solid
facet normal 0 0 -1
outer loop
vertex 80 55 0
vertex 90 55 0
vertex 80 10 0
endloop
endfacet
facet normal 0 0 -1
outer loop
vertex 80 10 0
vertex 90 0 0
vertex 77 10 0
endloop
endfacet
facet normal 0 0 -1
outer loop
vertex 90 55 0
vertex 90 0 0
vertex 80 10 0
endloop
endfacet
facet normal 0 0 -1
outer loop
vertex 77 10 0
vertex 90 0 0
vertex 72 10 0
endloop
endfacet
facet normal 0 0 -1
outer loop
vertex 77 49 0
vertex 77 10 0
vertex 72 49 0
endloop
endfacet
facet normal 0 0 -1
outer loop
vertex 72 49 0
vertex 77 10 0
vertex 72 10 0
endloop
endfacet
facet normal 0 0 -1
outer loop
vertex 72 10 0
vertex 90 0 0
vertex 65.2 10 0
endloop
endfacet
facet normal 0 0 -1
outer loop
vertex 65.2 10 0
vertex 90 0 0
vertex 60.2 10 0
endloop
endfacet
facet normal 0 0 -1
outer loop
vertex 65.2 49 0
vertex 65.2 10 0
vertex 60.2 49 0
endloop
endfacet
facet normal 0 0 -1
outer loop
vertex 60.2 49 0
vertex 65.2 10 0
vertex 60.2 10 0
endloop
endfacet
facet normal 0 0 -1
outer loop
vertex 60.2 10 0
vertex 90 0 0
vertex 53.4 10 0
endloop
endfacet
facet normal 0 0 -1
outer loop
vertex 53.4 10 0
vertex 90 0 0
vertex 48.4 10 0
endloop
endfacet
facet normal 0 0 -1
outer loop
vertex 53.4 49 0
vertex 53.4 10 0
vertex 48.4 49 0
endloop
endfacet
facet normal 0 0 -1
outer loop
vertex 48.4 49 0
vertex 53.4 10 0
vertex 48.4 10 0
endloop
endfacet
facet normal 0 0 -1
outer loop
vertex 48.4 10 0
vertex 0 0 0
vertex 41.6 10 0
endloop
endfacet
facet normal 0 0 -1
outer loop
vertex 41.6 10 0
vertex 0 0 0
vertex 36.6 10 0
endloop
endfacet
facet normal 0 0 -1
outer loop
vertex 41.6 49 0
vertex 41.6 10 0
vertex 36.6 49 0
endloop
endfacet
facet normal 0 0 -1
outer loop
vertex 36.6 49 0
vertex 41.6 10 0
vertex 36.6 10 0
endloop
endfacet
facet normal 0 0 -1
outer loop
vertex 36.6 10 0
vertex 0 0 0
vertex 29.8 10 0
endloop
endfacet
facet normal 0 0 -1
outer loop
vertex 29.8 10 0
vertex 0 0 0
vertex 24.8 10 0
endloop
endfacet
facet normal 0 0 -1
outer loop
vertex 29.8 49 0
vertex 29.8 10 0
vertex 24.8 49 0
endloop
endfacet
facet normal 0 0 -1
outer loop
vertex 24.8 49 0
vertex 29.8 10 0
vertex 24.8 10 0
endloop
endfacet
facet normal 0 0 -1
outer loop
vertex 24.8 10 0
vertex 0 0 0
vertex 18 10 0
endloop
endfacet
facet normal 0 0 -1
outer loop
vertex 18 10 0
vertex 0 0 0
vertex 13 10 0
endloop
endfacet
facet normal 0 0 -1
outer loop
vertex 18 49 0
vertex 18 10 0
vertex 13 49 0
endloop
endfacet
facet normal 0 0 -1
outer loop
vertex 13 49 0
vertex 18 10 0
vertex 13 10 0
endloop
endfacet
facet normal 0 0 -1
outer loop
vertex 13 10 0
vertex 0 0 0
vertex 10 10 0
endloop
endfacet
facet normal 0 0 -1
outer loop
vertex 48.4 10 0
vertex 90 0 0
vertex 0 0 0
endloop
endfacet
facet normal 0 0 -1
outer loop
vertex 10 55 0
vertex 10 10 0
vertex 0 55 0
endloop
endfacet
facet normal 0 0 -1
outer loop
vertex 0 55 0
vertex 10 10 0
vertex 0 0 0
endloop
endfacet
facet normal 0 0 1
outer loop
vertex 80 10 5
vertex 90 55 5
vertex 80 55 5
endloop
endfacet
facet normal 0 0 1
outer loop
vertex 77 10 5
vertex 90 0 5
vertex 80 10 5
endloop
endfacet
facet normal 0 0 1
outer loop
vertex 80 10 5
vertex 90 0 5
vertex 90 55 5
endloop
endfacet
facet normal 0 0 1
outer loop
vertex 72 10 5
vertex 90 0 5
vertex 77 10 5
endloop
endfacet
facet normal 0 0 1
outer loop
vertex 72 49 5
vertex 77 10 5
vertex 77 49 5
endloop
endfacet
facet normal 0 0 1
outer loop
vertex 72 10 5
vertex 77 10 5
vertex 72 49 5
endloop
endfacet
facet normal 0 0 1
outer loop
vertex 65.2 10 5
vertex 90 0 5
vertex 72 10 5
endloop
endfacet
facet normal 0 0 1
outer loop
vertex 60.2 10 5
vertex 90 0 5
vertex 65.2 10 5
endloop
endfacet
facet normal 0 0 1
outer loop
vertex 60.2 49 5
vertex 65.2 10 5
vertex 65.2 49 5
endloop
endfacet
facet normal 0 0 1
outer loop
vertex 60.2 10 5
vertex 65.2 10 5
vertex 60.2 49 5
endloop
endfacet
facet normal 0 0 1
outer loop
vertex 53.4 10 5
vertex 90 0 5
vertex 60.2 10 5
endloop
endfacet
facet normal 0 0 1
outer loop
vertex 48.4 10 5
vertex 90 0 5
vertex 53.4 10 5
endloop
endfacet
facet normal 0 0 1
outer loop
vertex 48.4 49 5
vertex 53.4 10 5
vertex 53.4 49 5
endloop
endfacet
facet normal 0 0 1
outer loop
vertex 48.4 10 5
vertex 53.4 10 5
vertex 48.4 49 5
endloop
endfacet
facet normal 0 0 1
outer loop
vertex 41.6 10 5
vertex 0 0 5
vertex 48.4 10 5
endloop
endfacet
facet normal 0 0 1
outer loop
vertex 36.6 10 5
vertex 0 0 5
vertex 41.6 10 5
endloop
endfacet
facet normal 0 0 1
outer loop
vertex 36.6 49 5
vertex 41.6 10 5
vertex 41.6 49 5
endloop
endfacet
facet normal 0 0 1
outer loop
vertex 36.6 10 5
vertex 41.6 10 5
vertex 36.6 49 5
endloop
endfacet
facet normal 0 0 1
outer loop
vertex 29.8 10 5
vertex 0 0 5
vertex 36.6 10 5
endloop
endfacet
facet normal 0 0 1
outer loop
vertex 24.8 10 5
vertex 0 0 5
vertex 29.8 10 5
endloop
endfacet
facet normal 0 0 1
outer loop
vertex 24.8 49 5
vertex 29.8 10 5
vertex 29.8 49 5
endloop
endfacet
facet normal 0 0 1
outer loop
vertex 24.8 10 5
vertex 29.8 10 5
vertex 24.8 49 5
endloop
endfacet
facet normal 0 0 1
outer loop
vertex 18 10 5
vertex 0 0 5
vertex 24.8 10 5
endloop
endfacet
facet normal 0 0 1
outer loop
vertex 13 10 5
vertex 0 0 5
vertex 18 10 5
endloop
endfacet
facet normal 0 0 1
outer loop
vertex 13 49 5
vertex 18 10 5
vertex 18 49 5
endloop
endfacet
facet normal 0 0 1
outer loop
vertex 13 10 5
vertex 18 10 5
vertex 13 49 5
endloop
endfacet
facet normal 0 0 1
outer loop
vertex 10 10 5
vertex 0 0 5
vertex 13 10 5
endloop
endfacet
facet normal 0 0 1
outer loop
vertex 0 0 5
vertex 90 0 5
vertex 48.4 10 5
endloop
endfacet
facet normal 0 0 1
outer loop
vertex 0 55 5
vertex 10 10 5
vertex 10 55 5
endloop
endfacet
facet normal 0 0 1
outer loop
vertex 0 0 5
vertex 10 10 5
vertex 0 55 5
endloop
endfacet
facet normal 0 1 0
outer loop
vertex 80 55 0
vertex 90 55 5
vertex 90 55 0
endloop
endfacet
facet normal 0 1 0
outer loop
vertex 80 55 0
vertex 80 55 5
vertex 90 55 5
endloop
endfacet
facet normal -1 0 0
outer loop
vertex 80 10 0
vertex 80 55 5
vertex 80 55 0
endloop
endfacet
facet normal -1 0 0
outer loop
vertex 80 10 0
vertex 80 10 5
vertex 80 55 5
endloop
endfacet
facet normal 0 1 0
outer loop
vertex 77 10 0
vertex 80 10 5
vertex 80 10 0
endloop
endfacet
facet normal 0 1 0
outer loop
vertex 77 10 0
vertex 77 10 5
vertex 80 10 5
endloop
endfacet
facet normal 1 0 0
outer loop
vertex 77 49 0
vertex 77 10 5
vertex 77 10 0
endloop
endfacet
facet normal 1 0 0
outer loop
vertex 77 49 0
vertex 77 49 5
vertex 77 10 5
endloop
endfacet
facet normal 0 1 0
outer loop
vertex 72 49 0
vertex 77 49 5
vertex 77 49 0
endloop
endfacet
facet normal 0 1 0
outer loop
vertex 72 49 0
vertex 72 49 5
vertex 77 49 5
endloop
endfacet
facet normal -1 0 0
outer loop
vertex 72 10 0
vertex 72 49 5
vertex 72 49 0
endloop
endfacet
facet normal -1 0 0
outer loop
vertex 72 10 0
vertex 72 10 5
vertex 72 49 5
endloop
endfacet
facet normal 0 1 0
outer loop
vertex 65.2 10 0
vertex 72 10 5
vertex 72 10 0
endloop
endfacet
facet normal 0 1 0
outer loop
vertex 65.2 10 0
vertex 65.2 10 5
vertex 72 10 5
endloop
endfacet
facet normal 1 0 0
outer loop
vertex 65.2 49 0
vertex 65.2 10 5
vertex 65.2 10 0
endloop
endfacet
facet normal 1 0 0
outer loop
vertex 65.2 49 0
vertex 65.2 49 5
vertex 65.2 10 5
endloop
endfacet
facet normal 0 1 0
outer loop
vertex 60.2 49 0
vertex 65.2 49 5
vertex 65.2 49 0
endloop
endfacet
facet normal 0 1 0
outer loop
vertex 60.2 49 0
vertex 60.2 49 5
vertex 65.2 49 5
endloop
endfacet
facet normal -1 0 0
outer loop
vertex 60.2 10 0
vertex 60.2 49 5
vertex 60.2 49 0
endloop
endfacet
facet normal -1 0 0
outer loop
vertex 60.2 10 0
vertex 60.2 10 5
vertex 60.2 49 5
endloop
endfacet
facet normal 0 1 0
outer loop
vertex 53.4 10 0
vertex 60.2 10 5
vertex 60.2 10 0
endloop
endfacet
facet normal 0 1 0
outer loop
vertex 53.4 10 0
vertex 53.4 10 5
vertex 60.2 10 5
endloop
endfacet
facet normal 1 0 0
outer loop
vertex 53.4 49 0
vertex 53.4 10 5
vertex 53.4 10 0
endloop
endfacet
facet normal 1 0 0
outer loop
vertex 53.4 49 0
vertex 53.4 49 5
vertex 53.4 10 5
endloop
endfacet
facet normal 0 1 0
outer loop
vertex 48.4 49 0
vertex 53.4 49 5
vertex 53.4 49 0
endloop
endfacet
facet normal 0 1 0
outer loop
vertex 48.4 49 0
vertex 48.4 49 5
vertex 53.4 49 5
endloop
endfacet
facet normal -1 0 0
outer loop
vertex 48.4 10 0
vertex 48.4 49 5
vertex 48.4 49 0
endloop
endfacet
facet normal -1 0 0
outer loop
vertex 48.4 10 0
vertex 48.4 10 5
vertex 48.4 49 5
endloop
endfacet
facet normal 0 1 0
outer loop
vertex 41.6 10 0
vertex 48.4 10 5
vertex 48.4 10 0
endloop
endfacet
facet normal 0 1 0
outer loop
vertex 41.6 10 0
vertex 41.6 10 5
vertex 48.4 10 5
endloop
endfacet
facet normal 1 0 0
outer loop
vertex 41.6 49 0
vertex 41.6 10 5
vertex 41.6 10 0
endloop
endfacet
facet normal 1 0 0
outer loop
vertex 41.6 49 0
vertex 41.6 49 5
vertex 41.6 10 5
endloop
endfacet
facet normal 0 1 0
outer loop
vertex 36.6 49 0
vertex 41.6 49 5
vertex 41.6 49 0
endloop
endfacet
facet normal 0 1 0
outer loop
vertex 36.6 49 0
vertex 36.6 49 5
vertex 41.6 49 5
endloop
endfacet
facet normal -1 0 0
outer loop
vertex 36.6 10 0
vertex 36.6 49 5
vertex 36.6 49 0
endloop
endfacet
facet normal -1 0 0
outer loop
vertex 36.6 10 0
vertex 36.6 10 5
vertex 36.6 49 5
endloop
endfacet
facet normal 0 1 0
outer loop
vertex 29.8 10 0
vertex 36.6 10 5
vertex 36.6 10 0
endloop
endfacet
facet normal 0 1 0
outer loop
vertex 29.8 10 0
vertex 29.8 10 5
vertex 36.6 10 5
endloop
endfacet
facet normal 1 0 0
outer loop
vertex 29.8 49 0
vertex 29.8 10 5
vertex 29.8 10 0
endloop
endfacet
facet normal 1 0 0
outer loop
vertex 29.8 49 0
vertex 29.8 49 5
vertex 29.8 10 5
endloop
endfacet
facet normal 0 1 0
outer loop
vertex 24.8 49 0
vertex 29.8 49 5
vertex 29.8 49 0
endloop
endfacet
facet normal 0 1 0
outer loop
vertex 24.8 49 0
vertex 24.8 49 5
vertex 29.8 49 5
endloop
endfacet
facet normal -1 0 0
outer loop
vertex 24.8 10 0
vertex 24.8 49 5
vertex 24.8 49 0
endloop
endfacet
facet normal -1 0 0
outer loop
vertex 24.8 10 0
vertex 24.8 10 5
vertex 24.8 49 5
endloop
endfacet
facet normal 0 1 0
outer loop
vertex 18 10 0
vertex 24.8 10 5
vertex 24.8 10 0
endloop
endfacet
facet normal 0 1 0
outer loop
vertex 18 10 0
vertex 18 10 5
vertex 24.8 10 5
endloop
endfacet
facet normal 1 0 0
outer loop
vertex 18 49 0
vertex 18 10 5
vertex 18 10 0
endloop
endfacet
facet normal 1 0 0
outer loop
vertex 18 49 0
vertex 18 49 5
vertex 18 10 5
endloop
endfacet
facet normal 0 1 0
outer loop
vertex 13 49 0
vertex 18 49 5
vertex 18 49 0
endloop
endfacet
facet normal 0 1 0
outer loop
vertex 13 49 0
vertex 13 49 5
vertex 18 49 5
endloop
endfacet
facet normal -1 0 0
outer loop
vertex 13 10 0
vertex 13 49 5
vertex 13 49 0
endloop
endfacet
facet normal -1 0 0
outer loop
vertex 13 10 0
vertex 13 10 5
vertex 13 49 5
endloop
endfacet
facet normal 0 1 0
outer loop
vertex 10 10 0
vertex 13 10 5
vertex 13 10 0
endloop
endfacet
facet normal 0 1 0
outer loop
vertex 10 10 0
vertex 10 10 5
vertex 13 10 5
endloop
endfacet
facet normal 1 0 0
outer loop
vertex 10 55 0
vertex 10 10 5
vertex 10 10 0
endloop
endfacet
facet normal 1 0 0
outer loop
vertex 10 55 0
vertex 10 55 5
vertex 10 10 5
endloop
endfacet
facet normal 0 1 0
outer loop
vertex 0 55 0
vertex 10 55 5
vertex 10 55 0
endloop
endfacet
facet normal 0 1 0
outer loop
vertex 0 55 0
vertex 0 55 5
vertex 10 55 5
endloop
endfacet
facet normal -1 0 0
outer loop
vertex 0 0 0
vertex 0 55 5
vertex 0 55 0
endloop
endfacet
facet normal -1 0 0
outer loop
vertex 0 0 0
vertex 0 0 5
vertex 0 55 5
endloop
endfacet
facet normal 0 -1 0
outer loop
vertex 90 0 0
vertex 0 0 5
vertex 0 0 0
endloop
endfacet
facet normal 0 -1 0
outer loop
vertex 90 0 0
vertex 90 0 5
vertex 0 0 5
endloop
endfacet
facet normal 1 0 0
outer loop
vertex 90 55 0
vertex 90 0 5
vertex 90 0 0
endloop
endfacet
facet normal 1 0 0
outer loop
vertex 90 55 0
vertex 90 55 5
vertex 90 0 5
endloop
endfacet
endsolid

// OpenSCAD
$fn = 32;

// ----------------------------------------------------------------------
// Guard grille: 6 slats over a 90 x 55 mm plate
// ----------------------------------------------------------------------

// --- parameters (mm) ---
profile_height = 5;       // extrusion height
profile_points = 32;      // points of the closed outline

profile = [[0, 0], [90, 0], [90, 55], [80, 55], [80, 10], [77, 10], [77, 49], [72, 49], [72, 10], [65.2, 10], [65.2, 49], [60.2, 49], [60.2, 10], [53.4, 10], [53.4, 49], [48.4, 49], [48.4, 10], [41.6, 10], [41.6, 49], [36.6, 49], [36.6, 10], [29.8, 10], [29.8, 49], [24.8, 49], [24.8, 10], [18, 10], [18, 49], [13, 49], [13, 10], [10, 10], [10, 55], [0, 55]];  // single closed polygon, 32 points, counter clockwise

// --- the one profile operation ---
linear_extrude(height = profile_height) polygon(points = profile);
